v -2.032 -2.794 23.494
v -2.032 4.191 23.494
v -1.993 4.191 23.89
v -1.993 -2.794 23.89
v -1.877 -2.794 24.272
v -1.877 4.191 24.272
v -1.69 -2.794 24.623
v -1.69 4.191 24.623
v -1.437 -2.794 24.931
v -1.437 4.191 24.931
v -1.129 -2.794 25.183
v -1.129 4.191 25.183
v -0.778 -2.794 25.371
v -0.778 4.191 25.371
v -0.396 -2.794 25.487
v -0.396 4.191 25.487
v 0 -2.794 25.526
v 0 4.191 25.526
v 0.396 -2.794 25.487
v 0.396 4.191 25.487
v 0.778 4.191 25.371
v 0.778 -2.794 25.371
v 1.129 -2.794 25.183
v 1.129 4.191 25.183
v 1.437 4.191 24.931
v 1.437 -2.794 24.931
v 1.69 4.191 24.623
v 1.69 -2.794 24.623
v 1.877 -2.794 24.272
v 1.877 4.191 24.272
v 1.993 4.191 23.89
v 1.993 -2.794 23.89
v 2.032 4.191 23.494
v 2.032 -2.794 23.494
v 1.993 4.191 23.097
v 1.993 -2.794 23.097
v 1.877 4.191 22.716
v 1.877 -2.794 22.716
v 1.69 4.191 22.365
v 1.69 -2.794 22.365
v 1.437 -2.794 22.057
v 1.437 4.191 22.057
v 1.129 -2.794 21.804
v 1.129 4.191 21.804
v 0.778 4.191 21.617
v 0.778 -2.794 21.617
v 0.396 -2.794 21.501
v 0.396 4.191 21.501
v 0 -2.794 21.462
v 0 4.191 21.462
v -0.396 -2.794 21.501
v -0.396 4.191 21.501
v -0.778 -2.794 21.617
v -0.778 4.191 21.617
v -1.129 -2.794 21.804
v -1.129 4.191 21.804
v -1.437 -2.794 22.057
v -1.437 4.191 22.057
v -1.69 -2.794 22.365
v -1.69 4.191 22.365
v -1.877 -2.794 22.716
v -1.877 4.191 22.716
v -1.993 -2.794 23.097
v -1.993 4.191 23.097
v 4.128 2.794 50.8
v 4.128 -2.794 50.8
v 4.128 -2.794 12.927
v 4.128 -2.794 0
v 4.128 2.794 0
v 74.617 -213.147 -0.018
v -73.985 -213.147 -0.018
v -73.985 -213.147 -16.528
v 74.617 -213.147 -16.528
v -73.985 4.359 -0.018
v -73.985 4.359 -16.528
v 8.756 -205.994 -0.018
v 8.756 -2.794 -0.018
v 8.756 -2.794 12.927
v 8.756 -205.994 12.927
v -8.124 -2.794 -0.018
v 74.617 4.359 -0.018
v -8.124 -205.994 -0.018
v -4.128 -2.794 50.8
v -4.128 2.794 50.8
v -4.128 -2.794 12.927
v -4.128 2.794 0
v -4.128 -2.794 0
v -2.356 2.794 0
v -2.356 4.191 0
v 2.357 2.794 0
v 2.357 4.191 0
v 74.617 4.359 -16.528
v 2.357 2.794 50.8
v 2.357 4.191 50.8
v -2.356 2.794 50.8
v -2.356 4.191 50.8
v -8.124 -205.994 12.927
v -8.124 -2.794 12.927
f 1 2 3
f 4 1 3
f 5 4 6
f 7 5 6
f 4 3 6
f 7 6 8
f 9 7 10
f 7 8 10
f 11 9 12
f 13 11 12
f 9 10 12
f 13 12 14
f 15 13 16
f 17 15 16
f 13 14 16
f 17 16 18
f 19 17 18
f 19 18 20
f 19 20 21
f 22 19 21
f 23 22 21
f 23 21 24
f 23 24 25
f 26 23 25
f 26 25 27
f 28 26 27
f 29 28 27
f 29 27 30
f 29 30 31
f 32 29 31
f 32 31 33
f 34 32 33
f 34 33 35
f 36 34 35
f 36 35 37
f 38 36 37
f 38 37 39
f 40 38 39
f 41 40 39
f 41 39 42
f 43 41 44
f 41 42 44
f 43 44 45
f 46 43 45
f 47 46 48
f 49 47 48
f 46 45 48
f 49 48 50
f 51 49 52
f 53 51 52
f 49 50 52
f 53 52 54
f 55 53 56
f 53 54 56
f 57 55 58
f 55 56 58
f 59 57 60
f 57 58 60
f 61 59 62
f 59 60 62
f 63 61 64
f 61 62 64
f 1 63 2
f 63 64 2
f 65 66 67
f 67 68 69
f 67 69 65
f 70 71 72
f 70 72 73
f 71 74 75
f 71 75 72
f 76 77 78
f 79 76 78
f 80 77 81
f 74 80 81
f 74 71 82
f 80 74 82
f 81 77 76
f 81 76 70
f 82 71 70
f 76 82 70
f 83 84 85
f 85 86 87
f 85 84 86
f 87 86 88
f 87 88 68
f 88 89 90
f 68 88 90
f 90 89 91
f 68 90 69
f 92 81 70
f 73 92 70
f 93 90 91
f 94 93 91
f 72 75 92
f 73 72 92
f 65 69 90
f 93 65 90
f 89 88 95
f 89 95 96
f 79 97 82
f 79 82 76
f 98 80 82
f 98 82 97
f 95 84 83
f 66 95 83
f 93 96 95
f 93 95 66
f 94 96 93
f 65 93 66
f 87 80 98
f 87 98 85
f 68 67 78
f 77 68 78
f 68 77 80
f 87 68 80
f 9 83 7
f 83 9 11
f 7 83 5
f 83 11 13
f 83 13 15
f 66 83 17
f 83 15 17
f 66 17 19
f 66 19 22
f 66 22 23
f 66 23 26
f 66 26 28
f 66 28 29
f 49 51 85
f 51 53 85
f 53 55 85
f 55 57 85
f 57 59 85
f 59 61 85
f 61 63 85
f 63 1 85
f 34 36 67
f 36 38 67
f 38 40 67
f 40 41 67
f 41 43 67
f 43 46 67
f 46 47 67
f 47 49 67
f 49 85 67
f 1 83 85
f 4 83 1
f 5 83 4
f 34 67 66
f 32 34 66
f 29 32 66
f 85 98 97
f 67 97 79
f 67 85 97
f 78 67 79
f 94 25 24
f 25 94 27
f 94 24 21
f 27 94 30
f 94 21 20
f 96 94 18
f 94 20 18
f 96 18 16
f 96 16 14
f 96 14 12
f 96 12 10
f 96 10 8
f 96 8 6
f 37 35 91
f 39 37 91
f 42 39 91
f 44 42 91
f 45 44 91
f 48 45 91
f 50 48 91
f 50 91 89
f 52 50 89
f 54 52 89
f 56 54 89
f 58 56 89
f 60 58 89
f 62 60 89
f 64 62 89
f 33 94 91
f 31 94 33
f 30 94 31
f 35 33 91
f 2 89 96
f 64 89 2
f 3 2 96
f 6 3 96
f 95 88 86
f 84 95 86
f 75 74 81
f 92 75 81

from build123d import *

# Parameters (mm, degrees)
F0_W     = 2.342829
F0_H     = 1.397
F0_W_2   = 2.34442
F1_DEPTH = 50.8
F3_D     = 4.064
F4_W     = 16.880292
F4_H     = 12.94488
F5_DEPTH = 203.2
F6_W     = 148.601494
F6_H     = 217.50565
F7_DEPTH = 16.51


with BuildPart() as f1:
    # F0 (on Top) → F1 (new body)
    with BuildSketch(Plane.XY):
        Polygon((-4.1275, -2.794), (4.1275, -2.794), (4.1275, 2.794), (2.9845, 2.794), (2.35712, 2.794), (0.0127, 2.794), (-0.0127, 2.794), (-2.355529, 2.794), (-4.1275, 2.794), align=None)
        with Locations((-1.184114, 3.4925)):
            Rectangle(F0_W, F0_H)
        with Locations((1.18491, 3.4925)):
            Rectangle(F0_W_2, F0_H)
        Polygon((-0.0127, 4.191), (-0.0127, 2.794), (0.0127, 2.794), (0.0127, 4.191), (0, 4.191), align=None)
    extrude(amount=F1_DEPTH)

    # F3 (through all)
    with Locations(Plane.XZ.offset(2.794)):
        with Locations((0, 23.493898)):
            Hole(F3_D / 2)

    # F4 (on face) → F5 (join)
    with BuildSketch(Plane.XZ.offset(2.794)):
        with Locations((0.316053, 6.454206)):
            Rectangle(F4_W, F4_H)
    extrude(amount=F5_DEPTH)

    # F6 (on face) → F7 (join)
    with BuildSketch(Plane(origin=(0, 0, -0.018234), x_dir=(1, 0, 0), z_dir=(0, 0, -1))):
        with Locations((0.316053, 104.394)):
            Rectangle(F6_W, F6_H)
    extrude(amount=F7_DEPTH)


solid = f1.part
